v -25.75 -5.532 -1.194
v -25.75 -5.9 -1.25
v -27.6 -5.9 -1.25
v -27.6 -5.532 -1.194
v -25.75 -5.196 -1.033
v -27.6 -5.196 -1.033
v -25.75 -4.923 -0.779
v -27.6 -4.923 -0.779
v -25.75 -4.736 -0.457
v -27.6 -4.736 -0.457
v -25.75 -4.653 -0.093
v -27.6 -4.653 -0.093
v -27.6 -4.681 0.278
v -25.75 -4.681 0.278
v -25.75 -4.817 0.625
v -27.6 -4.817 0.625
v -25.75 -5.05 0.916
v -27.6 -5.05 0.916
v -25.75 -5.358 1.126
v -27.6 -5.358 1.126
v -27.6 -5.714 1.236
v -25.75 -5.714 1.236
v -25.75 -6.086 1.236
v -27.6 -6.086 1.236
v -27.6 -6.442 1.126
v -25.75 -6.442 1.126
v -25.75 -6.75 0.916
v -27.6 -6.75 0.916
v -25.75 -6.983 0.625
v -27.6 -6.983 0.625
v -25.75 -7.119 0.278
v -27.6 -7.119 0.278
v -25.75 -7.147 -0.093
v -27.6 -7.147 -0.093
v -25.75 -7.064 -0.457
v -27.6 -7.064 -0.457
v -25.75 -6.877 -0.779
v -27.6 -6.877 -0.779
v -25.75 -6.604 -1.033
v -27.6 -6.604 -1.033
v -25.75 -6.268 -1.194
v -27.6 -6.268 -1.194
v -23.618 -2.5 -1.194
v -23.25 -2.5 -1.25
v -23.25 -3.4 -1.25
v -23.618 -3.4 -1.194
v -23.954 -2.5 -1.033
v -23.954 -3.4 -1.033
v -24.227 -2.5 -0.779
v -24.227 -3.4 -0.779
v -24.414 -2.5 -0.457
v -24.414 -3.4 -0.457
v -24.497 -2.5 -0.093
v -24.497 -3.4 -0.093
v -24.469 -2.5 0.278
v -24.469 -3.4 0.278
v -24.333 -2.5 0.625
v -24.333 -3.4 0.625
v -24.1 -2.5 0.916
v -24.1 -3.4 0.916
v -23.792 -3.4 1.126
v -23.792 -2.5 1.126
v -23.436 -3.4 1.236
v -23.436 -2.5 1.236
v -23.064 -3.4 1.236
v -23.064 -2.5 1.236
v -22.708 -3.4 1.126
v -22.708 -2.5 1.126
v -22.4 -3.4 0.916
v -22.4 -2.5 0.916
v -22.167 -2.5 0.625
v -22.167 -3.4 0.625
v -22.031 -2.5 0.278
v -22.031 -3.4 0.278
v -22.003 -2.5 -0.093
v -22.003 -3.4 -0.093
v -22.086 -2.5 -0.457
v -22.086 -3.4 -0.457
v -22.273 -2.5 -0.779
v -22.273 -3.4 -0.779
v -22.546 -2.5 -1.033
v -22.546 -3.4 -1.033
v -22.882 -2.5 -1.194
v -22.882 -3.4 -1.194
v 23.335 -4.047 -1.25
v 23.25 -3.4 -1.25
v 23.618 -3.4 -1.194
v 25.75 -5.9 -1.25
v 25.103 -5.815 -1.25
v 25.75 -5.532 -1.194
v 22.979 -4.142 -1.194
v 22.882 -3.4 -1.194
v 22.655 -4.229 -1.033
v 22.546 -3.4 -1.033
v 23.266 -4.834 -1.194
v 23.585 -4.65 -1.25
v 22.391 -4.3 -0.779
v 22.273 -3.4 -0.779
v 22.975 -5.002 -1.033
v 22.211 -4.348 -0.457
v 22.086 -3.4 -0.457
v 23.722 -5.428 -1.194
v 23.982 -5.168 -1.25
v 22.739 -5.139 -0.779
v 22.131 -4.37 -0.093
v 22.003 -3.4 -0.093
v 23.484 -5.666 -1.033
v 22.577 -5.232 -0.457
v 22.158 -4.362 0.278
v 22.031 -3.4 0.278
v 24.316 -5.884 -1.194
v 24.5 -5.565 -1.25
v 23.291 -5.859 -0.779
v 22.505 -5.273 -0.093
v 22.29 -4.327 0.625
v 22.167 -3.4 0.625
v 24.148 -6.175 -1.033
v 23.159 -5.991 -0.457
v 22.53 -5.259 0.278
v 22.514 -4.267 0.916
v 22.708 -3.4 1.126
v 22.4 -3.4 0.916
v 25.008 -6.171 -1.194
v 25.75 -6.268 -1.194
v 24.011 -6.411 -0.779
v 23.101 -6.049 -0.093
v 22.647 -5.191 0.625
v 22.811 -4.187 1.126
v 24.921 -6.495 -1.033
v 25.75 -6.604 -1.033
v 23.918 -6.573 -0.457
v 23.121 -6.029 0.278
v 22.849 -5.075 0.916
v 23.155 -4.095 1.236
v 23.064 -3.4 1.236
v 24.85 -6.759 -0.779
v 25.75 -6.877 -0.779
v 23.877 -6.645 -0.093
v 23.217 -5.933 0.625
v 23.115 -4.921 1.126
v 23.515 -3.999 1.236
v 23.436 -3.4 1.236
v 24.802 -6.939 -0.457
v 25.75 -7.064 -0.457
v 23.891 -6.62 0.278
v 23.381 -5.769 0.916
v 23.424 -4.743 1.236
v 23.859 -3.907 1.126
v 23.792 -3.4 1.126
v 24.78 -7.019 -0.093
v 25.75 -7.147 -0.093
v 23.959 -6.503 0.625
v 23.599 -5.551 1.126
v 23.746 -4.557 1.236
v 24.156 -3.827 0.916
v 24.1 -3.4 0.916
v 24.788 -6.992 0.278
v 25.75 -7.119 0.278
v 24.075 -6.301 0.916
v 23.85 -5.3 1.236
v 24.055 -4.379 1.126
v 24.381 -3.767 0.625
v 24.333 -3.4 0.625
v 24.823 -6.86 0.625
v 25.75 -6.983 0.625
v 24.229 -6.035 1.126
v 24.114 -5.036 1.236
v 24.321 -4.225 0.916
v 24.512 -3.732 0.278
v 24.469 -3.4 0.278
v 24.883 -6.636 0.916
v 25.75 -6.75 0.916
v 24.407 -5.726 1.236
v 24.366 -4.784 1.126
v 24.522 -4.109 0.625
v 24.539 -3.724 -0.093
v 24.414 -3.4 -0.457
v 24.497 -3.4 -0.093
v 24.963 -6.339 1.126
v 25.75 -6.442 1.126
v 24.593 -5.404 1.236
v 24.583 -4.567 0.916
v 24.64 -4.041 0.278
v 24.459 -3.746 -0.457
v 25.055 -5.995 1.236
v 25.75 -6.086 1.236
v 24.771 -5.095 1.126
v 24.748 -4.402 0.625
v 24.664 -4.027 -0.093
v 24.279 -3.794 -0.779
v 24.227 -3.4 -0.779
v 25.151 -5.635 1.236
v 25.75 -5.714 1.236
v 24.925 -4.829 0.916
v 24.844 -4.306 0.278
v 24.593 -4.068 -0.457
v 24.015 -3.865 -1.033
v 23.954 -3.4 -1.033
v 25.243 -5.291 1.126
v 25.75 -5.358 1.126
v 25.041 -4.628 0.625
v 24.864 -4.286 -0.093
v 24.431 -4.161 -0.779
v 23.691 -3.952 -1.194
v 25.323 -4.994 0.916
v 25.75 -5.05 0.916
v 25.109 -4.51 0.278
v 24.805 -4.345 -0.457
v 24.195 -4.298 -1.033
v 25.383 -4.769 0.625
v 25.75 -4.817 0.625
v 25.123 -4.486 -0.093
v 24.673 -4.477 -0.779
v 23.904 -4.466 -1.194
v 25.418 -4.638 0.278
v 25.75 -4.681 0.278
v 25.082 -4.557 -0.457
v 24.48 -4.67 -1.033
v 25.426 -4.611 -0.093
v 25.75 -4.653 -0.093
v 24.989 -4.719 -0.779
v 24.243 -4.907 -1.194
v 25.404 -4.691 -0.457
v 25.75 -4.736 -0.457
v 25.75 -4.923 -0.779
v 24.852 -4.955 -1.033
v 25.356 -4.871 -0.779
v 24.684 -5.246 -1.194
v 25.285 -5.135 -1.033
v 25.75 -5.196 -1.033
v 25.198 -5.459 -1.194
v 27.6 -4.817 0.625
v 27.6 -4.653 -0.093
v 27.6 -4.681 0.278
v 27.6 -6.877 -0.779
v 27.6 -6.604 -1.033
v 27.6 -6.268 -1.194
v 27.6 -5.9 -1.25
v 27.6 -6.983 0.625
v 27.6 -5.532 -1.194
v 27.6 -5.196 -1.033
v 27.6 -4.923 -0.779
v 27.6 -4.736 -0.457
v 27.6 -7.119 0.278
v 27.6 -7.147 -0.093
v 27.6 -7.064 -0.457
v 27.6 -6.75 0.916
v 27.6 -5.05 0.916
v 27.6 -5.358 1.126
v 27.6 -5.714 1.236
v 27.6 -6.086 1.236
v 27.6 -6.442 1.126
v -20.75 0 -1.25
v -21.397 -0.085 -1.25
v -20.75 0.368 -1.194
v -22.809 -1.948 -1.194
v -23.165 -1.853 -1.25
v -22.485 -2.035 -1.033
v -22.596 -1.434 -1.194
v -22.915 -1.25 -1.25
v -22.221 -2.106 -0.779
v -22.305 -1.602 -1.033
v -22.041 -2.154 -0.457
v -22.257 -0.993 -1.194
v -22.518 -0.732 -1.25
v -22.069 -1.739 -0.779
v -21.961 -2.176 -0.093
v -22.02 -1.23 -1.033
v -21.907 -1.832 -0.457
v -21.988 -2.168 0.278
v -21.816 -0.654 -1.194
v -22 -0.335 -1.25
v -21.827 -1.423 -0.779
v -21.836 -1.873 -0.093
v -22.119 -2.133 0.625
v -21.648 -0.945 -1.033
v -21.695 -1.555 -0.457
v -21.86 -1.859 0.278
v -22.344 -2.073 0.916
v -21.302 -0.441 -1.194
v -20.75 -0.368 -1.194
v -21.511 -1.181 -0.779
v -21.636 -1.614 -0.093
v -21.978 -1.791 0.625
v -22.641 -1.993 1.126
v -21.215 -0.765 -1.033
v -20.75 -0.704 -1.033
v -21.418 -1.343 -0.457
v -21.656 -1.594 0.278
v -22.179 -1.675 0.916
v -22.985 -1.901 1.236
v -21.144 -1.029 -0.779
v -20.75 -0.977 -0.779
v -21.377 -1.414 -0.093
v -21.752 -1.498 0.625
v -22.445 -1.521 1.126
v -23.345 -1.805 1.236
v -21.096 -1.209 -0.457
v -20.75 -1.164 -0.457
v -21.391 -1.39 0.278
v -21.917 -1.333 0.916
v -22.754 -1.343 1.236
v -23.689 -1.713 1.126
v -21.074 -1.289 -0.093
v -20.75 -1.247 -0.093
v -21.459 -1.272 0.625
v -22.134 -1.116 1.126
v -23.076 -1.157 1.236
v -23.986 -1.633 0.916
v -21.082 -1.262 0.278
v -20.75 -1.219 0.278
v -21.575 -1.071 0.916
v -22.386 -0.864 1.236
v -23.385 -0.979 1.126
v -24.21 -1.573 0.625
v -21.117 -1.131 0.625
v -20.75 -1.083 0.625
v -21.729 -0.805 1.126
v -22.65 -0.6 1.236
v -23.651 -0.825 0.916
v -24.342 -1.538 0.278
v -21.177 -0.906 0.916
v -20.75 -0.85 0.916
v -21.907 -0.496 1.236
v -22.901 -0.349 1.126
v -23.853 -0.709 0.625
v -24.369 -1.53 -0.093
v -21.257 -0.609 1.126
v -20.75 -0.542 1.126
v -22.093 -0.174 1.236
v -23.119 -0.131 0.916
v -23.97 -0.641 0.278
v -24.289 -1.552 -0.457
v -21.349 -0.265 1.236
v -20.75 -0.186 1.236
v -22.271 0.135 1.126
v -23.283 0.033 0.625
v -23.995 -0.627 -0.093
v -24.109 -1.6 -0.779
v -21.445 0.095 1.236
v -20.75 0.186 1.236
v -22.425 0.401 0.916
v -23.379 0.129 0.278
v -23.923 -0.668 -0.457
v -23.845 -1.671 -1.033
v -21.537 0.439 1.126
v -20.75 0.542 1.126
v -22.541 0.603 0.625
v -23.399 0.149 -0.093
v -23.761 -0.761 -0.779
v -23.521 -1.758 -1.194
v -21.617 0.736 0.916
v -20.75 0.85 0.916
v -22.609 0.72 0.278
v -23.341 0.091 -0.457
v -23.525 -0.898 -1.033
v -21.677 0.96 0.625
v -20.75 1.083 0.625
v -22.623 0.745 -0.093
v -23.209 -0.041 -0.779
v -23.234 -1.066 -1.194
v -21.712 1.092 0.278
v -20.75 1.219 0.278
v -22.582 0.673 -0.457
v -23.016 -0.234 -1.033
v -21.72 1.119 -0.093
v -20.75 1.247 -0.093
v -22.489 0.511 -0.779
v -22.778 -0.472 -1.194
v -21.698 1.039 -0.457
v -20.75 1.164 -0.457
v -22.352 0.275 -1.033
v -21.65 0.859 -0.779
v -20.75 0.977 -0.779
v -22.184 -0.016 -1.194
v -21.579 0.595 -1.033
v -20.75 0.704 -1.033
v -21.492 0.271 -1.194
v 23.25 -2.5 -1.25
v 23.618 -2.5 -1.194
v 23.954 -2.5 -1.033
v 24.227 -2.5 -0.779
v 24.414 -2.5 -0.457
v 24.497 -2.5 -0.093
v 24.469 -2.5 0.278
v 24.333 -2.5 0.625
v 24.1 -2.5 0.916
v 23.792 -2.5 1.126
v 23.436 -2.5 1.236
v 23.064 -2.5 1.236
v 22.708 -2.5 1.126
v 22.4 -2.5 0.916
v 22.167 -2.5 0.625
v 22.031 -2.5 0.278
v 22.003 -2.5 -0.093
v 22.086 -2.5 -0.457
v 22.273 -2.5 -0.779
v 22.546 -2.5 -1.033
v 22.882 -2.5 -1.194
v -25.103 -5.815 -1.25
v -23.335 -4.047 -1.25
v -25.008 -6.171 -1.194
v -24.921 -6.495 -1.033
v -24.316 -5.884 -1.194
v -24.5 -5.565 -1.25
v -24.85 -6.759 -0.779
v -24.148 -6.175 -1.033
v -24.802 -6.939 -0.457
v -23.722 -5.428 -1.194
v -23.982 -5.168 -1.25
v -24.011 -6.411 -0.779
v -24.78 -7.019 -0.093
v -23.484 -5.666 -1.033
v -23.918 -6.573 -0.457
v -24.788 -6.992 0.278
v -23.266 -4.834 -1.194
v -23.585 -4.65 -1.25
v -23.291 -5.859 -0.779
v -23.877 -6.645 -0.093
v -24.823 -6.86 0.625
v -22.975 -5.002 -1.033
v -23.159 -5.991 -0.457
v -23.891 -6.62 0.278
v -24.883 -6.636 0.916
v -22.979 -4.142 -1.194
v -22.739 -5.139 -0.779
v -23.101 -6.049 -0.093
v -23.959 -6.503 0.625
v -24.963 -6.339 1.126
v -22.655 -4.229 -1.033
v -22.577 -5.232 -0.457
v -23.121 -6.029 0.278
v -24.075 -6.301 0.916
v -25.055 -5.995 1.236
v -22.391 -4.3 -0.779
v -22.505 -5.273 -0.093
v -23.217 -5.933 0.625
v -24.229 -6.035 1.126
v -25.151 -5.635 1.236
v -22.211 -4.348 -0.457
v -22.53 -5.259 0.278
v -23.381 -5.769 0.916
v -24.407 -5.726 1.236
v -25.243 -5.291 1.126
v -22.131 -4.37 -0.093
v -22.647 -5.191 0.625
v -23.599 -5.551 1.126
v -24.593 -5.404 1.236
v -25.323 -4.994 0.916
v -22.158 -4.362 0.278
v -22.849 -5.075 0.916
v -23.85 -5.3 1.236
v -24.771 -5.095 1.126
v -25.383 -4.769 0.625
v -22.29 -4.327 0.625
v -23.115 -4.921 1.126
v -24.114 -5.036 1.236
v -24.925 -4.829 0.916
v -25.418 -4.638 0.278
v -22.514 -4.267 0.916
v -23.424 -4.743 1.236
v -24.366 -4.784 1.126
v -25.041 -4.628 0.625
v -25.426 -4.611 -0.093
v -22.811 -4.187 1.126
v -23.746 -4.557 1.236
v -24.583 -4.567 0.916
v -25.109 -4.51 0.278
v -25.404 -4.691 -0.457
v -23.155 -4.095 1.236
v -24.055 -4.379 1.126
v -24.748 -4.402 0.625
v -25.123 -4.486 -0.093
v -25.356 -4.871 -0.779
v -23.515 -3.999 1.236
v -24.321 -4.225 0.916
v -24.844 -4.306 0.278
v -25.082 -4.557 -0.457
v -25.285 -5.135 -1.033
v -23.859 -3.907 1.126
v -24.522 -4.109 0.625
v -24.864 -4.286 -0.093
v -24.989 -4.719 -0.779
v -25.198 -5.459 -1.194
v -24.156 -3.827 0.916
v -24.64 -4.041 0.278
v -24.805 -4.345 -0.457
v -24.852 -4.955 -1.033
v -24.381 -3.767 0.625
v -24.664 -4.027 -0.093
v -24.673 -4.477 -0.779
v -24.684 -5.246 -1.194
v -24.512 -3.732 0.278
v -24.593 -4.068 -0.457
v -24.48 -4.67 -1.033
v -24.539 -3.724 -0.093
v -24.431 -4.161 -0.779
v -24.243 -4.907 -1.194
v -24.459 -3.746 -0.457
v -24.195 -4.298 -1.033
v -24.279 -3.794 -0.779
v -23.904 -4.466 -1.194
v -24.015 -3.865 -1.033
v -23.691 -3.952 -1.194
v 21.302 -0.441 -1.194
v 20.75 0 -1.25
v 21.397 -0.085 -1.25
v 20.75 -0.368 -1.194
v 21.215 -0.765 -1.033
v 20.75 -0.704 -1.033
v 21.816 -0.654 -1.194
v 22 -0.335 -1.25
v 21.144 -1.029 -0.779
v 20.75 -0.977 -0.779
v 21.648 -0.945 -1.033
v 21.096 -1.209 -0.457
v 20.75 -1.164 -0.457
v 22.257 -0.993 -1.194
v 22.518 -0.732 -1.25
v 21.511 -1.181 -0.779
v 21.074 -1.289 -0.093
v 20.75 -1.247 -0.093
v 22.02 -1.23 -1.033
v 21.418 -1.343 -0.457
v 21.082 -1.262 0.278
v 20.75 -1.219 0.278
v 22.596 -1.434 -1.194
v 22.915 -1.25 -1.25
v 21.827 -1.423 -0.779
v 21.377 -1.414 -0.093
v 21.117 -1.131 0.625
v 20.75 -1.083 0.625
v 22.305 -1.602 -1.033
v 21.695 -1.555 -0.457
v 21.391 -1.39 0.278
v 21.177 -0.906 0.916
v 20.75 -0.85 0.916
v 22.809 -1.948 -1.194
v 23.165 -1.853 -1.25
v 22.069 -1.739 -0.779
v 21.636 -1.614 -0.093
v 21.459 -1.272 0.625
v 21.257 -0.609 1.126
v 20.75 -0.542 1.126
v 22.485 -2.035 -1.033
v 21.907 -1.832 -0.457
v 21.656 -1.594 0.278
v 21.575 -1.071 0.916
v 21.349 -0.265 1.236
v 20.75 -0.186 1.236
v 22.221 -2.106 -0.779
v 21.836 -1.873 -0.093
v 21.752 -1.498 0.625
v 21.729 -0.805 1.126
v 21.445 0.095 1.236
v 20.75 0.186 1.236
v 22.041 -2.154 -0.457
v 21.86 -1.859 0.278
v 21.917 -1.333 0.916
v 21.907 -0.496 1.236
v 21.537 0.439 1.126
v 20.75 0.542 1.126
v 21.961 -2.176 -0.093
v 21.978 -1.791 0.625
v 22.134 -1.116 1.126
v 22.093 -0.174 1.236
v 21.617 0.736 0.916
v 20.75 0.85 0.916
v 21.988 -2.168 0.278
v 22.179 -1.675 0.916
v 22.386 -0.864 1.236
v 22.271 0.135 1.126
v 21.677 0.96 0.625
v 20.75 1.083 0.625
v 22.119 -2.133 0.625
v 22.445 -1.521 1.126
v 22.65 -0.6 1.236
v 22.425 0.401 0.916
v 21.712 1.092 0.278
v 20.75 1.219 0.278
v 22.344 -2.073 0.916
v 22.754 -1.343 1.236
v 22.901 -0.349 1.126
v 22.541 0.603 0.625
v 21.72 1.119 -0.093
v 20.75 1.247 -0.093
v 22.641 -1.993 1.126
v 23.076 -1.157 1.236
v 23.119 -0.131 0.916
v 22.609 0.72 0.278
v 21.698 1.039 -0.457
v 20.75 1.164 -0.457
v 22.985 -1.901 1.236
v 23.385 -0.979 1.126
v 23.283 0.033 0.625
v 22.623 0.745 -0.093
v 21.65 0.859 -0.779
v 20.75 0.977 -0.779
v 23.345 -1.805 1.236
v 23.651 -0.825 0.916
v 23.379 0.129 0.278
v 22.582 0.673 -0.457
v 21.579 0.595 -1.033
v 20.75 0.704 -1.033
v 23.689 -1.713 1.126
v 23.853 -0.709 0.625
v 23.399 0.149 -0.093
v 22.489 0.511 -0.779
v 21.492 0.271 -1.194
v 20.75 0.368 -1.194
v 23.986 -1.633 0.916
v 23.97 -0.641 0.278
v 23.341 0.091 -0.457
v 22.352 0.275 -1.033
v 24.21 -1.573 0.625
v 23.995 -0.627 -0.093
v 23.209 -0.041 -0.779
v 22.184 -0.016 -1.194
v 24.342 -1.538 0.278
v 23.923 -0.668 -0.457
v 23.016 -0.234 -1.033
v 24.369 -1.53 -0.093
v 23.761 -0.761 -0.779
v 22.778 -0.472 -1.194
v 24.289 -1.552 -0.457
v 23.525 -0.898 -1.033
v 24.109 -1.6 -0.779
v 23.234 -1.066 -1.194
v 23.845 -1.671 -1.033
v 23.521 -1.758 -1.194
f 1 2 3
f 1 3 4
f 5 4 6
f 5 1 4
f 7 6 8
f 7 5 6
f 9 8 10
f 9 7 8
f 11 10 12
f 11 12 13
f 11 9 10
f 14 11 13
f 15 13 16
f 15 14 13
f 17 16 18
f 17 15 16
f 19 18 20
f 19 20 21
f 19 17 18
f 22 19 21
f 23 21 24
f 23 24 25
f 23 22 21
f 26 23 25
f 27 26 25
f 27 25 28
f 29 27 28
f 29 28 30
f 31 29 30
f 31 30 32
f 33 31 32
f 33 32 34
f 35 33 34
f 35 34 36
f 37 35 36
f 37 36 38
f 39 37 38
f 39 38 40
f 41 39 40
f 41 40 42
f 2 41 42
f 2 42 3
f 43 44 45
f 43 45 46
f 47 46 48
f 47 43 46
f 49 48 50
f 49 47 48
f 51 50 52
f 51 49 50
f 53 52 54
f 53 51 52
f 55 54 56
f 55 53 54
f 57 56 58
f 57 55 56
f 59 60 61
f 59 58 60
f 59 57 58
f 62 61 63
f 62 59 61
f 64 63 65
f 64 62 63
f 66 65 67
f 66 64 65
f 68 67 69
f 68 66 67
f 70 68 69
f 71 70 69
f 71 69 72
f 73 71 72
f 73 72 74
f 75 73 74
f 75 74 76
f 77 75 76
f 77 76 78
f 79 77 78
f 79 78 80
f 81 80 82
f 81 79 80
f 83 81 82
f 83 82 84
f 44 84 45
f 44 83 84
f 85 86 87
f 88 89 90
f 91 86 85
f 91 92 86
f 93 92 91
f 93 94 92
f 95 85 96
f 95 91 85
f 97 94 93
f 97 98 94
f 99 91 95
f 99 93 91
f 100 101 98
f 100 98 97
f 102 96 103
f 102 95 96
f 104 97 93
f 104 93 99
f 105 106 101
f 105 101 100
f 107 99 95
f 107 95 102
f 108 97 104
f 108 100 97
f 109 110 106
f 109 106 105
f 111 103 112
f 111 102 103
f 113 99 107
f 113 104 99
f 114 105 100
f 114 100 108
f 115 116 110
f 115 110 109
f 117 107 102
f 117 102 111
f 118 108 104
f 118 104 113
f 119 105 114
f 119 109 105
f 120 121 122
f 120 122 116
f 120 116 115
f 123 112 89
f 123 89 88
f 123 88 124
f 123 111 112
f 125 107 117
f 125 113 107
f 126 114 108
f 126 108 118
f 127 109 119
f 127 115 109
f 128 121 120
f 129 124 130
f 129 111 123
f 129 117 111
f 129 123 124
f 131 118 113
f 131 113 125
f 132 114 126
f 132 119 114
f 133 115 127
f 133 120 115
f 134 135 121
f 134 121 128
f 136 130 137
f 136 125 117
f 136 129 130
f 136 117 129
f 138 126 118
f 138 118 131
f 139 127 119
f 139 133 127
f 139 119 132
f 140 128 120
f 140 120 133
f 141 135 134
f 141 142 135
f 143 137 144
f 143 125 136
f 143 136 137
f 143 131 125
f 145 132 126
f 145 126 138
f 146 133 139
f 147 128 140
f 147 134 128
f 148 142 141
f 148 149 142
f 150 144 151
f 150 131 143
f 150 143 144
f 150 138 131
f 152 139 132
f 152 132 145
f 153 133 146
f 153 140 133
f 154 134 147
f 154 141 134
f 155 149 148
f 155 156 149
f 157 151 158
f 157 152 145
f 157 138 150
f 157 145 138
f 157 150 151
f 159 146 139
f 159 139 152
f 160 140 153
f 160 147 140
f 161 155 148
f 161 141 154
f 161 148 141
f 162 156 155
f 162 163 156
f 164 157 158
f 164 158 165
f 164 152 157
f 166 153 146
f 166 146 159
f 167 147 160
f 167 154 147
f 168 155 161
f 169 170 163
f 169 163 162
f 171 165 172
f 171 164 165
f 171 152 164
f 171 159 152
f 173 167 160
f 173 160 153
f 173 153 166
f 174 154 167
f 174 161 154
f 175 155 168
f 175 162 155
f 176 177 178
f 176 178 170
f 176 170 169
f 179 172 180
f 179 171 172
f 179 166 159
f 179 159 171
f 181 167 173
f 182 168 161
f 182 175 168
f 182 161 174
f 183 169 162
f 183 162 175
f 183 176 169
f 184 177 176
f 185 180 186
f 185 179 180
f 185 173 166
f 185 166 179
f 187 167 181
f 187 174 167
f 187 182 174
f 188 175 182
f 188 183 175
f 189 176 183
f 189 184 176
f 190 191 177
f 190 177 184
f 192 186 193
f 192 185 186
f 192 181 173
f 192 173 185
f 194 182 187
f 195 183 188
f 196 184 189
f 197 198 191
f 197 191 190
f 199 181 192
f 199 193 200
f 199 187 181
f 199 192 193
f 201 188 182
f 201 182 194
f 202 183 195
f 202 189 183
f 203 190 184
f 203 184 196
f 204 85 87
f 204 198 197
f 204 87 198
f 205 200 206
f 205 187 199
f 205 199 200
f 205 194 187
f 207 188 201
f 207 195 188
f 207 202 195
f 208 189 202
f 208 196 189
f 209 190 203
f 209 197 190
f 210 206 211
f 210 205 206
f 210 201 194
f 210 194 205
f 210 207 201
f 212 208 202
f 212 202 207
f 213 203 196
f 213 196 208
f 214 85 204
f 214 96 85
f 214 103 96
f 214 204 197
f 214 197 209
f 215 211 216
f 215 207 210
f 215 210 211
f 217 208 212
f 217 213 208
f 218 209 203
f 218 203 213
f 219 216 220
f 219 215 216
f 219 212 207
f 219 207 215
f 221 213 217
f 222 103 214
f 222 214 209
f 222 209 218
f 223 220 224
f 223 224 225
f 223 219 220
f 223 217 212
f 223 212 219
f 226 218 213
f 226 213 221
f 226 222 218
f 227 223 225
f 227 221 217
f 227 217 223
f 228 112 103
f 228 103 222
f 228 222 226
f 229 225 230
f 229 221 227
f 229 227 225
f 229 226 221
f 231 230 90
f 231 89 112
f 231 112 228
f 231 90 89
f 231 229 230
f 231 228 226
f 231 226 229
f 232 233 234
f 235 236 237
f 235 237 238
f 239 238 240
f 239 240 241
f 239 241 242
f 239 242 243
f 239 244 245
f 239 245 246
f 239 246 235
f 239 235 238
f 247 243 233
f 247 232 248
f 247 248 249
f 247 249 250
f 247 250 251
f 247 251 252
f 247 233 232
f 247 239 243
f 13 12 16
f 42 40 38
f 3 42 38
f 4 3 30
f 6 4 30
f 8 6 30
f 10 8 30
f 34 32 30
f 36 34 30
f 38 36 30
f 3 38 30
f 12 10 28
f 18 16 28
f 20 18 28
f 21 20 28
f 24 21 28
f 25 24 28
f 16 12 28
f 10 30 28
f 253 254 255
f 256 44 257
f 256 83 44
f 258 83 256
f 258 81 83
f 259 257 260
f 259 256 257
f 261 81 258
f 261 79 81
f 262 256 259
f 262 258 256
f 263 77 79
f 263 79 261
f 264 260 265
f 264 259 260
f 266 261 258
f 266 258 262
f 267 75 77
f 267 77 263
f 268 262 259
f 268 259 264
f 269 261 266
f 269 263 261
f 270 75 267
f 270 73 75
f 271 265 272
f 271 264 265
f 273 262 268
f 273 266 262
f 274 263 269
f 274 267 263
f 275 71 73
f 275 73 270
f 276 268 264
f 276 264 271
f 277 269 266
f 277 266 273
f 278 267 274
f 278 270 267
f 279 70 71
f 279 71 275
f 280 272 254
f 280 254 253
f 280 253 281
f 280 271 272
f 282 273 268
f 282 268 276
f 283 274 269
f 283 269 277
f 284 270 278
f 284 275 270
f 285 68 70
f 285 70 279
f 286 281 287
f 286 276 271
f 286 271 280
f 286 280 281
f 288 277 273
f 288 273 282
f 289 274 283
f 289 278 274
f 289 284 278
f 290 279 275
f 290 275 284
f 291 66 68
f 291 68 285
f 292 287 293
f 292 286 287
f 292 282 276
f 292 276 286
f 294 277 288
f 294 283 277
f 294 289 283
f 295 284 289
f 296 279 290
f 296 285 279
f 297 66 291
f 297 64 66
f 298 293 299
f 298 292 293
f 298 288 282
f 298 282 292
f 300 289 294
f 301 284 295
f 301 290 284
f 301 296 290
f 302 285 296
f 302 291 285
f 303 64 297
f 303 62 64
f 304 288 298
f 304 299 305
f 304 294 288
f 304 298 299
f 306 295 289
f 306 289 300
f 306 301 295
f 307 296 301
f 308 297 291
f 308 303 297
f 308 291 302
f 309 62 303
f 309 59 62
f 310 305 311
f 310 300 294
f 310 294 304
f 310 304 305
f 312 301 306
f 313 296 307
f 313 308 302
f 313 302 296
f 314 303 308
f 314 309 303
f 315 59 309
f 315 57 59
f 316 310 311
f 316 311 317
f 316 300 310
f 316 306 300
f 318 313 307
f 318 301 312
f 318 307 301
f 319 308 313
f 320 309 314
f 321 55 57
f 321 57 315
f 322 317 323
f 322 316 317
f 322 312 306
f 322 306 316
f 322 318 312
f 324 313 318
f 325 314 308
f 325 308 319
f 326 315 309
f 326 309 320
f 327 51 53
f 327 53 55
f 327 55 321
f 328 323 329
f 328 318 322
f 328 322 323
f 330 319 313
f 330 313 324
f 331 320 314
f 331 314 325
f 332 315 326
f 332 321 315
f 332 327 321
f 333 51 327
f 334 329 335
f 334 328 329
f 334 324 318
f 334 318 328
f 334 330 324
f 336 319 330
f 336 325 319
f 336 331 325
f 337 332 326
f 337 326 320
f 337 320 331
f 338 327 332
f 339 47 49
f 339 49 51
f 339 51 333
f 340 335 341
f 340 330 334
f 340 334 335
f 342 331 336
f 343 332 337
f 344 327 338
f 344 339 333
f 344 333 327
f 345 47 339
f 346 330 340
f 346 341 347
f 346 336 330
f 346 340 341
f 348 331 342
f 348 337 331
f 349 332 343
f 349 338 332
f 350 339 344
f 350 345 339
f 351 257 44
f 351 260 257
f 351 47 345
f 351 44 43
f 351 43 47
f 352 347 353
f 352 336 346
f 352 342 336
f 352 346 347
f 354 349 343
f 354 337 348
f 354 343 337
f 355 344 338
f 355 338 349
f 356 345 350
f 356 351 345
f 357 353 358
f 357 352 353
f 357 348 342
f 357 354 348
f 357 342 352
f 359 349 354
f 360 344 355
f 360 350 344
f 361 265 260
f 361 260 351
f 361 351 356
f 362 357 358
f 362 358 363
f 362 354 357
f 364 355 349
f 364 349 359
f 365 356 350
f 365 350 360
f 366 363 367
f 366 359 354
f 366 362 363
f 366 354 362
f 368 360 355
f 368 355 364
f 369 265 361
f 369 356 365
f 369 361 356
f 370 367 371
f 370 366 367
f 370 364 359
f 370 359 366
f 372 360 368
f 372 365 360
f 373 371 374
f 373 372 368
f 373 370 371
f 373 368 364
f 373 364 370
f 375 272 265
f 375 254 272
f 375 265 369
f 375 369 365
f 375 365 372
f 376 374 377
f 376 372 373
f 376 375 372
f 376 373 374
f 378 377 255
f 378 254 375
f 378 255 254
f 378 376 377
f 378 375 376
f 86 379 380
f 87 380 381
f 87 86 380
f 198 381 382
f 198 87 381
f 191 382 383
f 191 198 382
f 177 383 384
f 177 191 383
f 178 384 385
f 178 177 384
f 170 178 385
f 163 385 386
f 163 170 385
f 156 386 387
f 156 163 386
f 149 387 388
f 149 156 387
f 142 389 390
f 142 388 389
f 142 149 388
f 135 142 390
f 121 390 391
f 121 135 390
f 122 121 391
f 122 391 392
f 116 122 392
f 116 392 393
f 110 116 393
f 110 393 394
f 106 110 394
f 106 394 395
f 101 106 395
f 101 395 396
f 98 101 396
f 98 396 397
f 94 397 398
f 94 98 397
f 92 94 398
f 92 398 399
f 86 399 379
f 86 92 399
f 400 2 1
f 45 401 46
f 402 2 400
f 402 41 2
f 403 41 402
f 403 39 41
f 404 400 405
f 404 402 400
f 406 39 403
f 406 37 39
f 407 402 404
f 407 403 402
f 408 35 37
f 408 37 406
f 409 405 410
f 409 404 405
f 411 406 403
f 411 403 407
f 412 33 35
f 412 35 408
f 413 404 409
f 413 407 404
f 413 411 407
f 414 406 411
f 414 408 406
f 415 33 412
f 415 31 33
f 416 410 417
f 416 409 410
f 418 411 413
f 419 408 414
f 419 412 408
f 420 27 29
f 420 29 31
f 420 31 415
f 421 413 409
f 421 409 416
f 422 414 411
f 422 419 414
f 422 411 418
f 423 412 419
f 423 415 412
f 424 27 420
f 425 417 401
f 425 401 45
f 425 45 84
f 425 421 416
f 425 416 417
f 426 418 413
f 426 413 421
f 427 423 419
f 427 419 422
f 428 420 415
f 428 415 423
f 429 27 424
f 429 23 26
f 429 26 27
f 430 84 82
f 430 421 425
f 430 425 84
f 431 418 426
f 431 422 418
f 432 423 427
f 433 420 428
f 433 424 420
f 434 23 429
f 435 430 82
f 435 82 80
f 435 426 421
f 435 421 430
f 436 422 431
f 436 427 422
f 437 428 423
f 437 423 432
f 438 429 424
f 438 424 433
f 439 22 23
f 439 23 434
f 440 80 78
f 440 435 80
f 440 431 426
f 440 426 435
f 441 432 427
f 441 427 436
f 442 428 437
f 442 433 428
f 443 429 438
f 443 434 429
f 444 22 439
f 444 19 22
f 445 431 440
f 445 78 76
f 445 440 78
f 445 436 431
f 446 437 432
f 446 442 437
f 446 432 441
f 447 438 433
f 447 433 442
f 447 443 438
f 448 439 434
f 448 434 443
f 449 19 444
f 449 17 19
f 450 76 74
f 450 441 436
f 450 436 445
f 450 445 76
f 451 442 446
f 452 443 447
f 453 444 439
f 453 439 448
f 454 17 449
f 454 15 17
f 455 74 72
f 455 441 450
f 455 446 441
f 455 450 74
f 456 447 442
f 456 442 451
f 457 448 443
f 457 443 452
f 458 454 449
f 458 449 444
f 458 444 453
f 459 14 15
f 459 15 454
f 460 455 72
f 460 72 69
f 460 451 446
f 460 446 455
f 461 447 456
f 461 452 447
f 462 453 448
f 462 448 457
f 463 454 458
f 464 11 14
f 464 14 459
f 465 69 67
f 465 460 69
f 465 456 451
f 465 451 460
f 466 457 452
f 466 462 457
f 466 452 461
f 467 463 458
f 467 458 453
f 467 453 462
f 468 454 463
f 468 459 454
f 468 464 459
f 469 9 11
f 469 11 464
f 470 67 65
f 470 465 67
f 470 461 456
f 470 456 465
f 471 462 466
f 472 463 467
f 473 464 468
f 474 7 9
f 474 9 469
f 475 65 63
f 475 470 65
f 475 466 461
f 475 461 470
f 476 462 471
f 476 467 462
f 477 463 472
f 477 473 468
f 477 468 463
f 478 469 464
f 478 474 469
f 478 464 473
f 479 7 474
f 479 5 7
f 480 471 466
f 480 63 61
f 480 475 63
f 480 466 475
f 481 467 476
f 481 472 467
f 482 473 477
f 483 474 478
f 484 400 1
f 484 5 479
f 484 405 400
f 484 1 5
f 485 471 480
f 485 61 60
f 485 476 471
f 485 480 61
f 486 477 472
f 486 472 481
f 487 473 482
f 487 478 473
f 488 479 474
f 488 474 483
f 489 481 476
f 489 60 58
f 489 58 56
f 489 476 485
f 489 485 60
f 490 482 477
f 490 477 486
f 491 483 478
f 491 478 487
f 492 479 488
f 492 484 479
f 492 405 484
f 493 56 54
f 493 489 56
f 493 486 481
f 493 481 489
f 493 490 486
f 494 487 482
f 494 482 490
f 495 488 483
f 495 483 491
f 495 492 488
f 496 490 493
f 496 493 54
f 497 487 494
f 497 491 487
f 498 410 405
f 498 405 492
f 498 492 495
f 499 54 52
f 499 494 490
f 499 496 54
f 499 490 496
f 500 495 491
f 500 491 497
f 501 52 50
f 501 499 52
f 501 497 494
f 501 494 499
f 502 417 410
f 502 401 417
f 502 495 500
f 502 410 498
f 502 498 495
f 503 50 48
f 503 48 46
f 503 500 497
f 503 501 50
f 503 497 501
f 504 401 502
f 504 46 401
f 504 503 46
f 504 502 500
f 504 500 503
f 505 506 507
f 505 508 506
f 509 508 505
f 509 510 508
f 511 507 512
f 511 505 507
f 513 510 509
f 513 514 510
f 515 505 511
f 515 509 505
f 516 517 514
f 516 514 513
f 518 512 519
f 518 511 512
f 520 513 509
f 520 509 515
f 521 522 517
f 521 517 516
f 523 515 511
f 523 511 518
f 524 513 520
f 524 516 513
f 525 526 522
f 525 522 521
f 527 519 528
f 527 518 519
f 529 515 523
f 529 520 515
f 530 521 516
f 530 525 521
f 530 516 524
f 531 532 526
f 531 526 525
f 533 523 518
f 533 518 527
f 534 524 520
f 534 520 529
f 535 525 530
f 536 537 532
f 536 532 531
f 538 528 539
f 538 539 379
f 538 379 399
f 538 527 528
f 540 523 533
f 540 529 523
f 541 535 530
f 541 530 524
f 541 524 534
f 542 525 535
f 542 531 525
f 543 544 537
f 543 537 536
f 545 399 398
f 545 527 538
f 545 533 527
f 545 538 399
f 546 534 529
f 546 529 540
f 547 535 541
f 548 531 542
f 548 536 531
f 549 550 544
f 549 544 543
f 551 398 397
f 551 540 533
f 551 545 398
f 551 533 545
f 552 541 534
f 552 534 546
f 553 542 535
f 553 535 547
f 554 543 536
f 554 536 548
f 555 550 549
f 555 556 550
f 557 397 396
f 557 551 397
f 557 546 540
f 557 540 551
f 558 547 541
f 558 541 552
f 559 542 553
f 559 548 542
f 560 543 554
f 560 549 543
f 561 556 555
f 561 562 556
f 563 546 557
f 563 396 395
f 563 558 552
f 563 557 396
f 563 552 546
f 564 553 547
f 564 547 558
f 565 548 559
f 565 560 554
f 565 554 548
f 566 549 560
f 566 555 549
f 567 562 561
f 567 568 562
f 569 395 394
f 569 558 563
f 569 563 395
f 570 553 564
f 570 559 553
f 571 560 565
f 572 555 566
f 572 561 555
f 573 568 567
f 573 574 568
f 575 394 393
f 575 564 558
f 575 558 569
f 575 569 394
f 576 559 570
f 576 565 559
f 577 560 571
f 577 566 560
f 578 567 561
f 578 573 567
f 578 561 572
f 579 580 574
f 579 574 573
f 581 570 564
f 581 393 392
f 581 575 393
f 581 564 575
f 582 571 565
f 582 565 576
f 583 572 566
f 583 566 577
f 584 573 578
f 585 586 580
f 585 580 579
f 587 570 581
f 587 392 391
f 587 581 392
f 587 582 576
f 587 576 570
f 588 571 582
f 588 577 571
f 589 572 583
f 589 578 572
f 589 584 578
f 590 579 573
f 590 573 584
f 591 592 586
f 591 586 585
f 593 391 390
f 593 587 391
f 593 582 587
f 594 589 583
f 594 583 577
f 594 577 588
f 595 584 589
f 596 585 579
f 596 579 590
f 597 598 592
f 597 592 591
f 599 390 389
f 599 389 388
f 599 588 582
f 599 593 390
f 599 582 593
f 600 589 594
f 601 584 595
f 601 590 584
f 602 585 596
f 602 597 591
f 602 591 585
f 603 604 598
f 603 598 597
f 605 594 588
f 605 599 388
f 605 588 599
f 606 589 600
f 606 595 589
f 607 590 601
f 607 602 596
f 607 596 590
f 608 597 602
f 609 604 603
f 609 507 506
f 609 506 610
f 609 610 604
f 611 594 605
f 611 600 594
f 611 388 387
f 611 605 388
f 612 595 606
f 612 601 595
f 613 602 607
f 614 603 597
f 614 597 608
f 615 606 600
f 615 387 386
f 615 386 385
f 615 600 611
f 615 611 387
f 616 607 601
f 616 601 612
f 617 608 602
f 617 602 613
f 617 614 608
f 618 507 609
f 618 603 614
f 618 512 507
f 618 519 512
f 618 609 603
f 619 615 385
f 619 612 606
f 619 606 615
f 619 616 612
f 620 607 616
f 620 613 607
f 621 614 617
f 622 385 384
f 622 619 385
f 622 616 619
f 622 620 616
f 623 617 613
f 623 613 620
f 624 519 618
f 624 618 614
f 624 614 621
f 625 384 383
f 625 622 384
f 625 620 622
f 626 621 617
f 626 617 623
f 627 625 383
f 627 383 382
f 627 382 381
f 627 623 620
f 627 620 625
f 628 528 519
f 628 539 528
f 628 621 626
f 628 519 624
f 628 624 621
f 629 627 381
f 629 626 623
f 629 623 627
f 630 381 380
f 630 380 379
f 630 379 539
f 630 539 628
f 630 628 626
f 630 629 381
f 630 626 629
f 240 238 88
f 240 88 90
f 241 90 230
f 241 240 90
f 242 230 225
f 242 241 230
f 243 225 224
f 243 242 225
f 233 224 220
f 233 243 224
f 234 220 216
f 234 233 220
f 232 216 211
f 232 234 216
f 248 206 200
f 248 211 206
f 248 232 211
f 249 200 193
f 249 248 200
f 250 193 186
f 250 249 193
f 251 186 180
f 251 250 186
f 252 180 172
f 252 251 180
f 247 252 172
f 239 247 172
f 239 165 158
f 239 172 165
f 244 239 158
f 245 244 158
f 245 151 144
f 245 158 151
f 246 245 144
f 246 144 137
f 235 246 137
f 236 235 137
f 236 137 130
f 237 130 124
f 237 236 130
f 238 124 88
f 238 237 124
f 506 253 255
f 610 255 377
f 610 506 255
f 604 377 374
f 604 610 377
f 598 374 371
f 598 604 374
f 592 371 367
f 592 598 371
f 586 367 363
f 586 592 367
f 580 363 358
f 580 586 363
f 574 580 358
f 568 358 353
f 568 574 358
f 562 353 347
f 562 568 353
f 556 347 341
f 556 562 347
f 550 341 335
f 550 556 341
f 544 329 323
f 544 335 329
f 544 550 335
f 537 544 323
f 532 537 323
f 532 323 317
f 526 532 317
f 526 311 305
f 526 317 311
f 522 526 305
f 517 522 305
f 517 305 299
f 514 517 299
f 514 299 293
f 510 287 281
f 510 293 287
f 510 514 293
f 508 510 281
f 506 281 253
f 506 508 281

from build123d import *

# Parameters (mm, degrees)
CROQUIS2_R = 1.25


with BuildPart() as part:
    # Barrer1: sweep along a path in Croquis1
    with BuildLine(Plane.XY) as barrer1_path:
        Line((-27.6, -5.9), (-25.75, -5.9))
        ThreePointArc((-25.75, -5.9), (-23.982233047, -5.167766953), (-23.25, -3.4))
        Line((-23.25, -3.4), (-23.25, -2.5))
        ThreePointArc((-23.25, -2.5), (-22.517766953, -0.732233047), (-20.75, 0))
        Line((-20.75, 0), (20.75, 0))
        ThreePointArc((20.75, 0), (22.517766953, -0.732233047), (23.25, -2.5))
        Line((23.25, -2.5), (23.25, -3.4))
        ThreePointArc((23.25, -3.4), (23.982233047, -5.167766953), (25.75, -5.9))
        Line((25.75, -5.9), (27.6, -5.9))
    # Croquis2 → Barrer1 (sweep)
    with BuildSketch(Plane(origin=(27.6, 0, 0), x_dir=(0, 0, -1), z_dir=(1, 0, 0))):
        with Locations((0, -5.9)):
            Circle(CROQUIS2_R)
    sweep(path=barrer1_path.line)


solid = part.part
